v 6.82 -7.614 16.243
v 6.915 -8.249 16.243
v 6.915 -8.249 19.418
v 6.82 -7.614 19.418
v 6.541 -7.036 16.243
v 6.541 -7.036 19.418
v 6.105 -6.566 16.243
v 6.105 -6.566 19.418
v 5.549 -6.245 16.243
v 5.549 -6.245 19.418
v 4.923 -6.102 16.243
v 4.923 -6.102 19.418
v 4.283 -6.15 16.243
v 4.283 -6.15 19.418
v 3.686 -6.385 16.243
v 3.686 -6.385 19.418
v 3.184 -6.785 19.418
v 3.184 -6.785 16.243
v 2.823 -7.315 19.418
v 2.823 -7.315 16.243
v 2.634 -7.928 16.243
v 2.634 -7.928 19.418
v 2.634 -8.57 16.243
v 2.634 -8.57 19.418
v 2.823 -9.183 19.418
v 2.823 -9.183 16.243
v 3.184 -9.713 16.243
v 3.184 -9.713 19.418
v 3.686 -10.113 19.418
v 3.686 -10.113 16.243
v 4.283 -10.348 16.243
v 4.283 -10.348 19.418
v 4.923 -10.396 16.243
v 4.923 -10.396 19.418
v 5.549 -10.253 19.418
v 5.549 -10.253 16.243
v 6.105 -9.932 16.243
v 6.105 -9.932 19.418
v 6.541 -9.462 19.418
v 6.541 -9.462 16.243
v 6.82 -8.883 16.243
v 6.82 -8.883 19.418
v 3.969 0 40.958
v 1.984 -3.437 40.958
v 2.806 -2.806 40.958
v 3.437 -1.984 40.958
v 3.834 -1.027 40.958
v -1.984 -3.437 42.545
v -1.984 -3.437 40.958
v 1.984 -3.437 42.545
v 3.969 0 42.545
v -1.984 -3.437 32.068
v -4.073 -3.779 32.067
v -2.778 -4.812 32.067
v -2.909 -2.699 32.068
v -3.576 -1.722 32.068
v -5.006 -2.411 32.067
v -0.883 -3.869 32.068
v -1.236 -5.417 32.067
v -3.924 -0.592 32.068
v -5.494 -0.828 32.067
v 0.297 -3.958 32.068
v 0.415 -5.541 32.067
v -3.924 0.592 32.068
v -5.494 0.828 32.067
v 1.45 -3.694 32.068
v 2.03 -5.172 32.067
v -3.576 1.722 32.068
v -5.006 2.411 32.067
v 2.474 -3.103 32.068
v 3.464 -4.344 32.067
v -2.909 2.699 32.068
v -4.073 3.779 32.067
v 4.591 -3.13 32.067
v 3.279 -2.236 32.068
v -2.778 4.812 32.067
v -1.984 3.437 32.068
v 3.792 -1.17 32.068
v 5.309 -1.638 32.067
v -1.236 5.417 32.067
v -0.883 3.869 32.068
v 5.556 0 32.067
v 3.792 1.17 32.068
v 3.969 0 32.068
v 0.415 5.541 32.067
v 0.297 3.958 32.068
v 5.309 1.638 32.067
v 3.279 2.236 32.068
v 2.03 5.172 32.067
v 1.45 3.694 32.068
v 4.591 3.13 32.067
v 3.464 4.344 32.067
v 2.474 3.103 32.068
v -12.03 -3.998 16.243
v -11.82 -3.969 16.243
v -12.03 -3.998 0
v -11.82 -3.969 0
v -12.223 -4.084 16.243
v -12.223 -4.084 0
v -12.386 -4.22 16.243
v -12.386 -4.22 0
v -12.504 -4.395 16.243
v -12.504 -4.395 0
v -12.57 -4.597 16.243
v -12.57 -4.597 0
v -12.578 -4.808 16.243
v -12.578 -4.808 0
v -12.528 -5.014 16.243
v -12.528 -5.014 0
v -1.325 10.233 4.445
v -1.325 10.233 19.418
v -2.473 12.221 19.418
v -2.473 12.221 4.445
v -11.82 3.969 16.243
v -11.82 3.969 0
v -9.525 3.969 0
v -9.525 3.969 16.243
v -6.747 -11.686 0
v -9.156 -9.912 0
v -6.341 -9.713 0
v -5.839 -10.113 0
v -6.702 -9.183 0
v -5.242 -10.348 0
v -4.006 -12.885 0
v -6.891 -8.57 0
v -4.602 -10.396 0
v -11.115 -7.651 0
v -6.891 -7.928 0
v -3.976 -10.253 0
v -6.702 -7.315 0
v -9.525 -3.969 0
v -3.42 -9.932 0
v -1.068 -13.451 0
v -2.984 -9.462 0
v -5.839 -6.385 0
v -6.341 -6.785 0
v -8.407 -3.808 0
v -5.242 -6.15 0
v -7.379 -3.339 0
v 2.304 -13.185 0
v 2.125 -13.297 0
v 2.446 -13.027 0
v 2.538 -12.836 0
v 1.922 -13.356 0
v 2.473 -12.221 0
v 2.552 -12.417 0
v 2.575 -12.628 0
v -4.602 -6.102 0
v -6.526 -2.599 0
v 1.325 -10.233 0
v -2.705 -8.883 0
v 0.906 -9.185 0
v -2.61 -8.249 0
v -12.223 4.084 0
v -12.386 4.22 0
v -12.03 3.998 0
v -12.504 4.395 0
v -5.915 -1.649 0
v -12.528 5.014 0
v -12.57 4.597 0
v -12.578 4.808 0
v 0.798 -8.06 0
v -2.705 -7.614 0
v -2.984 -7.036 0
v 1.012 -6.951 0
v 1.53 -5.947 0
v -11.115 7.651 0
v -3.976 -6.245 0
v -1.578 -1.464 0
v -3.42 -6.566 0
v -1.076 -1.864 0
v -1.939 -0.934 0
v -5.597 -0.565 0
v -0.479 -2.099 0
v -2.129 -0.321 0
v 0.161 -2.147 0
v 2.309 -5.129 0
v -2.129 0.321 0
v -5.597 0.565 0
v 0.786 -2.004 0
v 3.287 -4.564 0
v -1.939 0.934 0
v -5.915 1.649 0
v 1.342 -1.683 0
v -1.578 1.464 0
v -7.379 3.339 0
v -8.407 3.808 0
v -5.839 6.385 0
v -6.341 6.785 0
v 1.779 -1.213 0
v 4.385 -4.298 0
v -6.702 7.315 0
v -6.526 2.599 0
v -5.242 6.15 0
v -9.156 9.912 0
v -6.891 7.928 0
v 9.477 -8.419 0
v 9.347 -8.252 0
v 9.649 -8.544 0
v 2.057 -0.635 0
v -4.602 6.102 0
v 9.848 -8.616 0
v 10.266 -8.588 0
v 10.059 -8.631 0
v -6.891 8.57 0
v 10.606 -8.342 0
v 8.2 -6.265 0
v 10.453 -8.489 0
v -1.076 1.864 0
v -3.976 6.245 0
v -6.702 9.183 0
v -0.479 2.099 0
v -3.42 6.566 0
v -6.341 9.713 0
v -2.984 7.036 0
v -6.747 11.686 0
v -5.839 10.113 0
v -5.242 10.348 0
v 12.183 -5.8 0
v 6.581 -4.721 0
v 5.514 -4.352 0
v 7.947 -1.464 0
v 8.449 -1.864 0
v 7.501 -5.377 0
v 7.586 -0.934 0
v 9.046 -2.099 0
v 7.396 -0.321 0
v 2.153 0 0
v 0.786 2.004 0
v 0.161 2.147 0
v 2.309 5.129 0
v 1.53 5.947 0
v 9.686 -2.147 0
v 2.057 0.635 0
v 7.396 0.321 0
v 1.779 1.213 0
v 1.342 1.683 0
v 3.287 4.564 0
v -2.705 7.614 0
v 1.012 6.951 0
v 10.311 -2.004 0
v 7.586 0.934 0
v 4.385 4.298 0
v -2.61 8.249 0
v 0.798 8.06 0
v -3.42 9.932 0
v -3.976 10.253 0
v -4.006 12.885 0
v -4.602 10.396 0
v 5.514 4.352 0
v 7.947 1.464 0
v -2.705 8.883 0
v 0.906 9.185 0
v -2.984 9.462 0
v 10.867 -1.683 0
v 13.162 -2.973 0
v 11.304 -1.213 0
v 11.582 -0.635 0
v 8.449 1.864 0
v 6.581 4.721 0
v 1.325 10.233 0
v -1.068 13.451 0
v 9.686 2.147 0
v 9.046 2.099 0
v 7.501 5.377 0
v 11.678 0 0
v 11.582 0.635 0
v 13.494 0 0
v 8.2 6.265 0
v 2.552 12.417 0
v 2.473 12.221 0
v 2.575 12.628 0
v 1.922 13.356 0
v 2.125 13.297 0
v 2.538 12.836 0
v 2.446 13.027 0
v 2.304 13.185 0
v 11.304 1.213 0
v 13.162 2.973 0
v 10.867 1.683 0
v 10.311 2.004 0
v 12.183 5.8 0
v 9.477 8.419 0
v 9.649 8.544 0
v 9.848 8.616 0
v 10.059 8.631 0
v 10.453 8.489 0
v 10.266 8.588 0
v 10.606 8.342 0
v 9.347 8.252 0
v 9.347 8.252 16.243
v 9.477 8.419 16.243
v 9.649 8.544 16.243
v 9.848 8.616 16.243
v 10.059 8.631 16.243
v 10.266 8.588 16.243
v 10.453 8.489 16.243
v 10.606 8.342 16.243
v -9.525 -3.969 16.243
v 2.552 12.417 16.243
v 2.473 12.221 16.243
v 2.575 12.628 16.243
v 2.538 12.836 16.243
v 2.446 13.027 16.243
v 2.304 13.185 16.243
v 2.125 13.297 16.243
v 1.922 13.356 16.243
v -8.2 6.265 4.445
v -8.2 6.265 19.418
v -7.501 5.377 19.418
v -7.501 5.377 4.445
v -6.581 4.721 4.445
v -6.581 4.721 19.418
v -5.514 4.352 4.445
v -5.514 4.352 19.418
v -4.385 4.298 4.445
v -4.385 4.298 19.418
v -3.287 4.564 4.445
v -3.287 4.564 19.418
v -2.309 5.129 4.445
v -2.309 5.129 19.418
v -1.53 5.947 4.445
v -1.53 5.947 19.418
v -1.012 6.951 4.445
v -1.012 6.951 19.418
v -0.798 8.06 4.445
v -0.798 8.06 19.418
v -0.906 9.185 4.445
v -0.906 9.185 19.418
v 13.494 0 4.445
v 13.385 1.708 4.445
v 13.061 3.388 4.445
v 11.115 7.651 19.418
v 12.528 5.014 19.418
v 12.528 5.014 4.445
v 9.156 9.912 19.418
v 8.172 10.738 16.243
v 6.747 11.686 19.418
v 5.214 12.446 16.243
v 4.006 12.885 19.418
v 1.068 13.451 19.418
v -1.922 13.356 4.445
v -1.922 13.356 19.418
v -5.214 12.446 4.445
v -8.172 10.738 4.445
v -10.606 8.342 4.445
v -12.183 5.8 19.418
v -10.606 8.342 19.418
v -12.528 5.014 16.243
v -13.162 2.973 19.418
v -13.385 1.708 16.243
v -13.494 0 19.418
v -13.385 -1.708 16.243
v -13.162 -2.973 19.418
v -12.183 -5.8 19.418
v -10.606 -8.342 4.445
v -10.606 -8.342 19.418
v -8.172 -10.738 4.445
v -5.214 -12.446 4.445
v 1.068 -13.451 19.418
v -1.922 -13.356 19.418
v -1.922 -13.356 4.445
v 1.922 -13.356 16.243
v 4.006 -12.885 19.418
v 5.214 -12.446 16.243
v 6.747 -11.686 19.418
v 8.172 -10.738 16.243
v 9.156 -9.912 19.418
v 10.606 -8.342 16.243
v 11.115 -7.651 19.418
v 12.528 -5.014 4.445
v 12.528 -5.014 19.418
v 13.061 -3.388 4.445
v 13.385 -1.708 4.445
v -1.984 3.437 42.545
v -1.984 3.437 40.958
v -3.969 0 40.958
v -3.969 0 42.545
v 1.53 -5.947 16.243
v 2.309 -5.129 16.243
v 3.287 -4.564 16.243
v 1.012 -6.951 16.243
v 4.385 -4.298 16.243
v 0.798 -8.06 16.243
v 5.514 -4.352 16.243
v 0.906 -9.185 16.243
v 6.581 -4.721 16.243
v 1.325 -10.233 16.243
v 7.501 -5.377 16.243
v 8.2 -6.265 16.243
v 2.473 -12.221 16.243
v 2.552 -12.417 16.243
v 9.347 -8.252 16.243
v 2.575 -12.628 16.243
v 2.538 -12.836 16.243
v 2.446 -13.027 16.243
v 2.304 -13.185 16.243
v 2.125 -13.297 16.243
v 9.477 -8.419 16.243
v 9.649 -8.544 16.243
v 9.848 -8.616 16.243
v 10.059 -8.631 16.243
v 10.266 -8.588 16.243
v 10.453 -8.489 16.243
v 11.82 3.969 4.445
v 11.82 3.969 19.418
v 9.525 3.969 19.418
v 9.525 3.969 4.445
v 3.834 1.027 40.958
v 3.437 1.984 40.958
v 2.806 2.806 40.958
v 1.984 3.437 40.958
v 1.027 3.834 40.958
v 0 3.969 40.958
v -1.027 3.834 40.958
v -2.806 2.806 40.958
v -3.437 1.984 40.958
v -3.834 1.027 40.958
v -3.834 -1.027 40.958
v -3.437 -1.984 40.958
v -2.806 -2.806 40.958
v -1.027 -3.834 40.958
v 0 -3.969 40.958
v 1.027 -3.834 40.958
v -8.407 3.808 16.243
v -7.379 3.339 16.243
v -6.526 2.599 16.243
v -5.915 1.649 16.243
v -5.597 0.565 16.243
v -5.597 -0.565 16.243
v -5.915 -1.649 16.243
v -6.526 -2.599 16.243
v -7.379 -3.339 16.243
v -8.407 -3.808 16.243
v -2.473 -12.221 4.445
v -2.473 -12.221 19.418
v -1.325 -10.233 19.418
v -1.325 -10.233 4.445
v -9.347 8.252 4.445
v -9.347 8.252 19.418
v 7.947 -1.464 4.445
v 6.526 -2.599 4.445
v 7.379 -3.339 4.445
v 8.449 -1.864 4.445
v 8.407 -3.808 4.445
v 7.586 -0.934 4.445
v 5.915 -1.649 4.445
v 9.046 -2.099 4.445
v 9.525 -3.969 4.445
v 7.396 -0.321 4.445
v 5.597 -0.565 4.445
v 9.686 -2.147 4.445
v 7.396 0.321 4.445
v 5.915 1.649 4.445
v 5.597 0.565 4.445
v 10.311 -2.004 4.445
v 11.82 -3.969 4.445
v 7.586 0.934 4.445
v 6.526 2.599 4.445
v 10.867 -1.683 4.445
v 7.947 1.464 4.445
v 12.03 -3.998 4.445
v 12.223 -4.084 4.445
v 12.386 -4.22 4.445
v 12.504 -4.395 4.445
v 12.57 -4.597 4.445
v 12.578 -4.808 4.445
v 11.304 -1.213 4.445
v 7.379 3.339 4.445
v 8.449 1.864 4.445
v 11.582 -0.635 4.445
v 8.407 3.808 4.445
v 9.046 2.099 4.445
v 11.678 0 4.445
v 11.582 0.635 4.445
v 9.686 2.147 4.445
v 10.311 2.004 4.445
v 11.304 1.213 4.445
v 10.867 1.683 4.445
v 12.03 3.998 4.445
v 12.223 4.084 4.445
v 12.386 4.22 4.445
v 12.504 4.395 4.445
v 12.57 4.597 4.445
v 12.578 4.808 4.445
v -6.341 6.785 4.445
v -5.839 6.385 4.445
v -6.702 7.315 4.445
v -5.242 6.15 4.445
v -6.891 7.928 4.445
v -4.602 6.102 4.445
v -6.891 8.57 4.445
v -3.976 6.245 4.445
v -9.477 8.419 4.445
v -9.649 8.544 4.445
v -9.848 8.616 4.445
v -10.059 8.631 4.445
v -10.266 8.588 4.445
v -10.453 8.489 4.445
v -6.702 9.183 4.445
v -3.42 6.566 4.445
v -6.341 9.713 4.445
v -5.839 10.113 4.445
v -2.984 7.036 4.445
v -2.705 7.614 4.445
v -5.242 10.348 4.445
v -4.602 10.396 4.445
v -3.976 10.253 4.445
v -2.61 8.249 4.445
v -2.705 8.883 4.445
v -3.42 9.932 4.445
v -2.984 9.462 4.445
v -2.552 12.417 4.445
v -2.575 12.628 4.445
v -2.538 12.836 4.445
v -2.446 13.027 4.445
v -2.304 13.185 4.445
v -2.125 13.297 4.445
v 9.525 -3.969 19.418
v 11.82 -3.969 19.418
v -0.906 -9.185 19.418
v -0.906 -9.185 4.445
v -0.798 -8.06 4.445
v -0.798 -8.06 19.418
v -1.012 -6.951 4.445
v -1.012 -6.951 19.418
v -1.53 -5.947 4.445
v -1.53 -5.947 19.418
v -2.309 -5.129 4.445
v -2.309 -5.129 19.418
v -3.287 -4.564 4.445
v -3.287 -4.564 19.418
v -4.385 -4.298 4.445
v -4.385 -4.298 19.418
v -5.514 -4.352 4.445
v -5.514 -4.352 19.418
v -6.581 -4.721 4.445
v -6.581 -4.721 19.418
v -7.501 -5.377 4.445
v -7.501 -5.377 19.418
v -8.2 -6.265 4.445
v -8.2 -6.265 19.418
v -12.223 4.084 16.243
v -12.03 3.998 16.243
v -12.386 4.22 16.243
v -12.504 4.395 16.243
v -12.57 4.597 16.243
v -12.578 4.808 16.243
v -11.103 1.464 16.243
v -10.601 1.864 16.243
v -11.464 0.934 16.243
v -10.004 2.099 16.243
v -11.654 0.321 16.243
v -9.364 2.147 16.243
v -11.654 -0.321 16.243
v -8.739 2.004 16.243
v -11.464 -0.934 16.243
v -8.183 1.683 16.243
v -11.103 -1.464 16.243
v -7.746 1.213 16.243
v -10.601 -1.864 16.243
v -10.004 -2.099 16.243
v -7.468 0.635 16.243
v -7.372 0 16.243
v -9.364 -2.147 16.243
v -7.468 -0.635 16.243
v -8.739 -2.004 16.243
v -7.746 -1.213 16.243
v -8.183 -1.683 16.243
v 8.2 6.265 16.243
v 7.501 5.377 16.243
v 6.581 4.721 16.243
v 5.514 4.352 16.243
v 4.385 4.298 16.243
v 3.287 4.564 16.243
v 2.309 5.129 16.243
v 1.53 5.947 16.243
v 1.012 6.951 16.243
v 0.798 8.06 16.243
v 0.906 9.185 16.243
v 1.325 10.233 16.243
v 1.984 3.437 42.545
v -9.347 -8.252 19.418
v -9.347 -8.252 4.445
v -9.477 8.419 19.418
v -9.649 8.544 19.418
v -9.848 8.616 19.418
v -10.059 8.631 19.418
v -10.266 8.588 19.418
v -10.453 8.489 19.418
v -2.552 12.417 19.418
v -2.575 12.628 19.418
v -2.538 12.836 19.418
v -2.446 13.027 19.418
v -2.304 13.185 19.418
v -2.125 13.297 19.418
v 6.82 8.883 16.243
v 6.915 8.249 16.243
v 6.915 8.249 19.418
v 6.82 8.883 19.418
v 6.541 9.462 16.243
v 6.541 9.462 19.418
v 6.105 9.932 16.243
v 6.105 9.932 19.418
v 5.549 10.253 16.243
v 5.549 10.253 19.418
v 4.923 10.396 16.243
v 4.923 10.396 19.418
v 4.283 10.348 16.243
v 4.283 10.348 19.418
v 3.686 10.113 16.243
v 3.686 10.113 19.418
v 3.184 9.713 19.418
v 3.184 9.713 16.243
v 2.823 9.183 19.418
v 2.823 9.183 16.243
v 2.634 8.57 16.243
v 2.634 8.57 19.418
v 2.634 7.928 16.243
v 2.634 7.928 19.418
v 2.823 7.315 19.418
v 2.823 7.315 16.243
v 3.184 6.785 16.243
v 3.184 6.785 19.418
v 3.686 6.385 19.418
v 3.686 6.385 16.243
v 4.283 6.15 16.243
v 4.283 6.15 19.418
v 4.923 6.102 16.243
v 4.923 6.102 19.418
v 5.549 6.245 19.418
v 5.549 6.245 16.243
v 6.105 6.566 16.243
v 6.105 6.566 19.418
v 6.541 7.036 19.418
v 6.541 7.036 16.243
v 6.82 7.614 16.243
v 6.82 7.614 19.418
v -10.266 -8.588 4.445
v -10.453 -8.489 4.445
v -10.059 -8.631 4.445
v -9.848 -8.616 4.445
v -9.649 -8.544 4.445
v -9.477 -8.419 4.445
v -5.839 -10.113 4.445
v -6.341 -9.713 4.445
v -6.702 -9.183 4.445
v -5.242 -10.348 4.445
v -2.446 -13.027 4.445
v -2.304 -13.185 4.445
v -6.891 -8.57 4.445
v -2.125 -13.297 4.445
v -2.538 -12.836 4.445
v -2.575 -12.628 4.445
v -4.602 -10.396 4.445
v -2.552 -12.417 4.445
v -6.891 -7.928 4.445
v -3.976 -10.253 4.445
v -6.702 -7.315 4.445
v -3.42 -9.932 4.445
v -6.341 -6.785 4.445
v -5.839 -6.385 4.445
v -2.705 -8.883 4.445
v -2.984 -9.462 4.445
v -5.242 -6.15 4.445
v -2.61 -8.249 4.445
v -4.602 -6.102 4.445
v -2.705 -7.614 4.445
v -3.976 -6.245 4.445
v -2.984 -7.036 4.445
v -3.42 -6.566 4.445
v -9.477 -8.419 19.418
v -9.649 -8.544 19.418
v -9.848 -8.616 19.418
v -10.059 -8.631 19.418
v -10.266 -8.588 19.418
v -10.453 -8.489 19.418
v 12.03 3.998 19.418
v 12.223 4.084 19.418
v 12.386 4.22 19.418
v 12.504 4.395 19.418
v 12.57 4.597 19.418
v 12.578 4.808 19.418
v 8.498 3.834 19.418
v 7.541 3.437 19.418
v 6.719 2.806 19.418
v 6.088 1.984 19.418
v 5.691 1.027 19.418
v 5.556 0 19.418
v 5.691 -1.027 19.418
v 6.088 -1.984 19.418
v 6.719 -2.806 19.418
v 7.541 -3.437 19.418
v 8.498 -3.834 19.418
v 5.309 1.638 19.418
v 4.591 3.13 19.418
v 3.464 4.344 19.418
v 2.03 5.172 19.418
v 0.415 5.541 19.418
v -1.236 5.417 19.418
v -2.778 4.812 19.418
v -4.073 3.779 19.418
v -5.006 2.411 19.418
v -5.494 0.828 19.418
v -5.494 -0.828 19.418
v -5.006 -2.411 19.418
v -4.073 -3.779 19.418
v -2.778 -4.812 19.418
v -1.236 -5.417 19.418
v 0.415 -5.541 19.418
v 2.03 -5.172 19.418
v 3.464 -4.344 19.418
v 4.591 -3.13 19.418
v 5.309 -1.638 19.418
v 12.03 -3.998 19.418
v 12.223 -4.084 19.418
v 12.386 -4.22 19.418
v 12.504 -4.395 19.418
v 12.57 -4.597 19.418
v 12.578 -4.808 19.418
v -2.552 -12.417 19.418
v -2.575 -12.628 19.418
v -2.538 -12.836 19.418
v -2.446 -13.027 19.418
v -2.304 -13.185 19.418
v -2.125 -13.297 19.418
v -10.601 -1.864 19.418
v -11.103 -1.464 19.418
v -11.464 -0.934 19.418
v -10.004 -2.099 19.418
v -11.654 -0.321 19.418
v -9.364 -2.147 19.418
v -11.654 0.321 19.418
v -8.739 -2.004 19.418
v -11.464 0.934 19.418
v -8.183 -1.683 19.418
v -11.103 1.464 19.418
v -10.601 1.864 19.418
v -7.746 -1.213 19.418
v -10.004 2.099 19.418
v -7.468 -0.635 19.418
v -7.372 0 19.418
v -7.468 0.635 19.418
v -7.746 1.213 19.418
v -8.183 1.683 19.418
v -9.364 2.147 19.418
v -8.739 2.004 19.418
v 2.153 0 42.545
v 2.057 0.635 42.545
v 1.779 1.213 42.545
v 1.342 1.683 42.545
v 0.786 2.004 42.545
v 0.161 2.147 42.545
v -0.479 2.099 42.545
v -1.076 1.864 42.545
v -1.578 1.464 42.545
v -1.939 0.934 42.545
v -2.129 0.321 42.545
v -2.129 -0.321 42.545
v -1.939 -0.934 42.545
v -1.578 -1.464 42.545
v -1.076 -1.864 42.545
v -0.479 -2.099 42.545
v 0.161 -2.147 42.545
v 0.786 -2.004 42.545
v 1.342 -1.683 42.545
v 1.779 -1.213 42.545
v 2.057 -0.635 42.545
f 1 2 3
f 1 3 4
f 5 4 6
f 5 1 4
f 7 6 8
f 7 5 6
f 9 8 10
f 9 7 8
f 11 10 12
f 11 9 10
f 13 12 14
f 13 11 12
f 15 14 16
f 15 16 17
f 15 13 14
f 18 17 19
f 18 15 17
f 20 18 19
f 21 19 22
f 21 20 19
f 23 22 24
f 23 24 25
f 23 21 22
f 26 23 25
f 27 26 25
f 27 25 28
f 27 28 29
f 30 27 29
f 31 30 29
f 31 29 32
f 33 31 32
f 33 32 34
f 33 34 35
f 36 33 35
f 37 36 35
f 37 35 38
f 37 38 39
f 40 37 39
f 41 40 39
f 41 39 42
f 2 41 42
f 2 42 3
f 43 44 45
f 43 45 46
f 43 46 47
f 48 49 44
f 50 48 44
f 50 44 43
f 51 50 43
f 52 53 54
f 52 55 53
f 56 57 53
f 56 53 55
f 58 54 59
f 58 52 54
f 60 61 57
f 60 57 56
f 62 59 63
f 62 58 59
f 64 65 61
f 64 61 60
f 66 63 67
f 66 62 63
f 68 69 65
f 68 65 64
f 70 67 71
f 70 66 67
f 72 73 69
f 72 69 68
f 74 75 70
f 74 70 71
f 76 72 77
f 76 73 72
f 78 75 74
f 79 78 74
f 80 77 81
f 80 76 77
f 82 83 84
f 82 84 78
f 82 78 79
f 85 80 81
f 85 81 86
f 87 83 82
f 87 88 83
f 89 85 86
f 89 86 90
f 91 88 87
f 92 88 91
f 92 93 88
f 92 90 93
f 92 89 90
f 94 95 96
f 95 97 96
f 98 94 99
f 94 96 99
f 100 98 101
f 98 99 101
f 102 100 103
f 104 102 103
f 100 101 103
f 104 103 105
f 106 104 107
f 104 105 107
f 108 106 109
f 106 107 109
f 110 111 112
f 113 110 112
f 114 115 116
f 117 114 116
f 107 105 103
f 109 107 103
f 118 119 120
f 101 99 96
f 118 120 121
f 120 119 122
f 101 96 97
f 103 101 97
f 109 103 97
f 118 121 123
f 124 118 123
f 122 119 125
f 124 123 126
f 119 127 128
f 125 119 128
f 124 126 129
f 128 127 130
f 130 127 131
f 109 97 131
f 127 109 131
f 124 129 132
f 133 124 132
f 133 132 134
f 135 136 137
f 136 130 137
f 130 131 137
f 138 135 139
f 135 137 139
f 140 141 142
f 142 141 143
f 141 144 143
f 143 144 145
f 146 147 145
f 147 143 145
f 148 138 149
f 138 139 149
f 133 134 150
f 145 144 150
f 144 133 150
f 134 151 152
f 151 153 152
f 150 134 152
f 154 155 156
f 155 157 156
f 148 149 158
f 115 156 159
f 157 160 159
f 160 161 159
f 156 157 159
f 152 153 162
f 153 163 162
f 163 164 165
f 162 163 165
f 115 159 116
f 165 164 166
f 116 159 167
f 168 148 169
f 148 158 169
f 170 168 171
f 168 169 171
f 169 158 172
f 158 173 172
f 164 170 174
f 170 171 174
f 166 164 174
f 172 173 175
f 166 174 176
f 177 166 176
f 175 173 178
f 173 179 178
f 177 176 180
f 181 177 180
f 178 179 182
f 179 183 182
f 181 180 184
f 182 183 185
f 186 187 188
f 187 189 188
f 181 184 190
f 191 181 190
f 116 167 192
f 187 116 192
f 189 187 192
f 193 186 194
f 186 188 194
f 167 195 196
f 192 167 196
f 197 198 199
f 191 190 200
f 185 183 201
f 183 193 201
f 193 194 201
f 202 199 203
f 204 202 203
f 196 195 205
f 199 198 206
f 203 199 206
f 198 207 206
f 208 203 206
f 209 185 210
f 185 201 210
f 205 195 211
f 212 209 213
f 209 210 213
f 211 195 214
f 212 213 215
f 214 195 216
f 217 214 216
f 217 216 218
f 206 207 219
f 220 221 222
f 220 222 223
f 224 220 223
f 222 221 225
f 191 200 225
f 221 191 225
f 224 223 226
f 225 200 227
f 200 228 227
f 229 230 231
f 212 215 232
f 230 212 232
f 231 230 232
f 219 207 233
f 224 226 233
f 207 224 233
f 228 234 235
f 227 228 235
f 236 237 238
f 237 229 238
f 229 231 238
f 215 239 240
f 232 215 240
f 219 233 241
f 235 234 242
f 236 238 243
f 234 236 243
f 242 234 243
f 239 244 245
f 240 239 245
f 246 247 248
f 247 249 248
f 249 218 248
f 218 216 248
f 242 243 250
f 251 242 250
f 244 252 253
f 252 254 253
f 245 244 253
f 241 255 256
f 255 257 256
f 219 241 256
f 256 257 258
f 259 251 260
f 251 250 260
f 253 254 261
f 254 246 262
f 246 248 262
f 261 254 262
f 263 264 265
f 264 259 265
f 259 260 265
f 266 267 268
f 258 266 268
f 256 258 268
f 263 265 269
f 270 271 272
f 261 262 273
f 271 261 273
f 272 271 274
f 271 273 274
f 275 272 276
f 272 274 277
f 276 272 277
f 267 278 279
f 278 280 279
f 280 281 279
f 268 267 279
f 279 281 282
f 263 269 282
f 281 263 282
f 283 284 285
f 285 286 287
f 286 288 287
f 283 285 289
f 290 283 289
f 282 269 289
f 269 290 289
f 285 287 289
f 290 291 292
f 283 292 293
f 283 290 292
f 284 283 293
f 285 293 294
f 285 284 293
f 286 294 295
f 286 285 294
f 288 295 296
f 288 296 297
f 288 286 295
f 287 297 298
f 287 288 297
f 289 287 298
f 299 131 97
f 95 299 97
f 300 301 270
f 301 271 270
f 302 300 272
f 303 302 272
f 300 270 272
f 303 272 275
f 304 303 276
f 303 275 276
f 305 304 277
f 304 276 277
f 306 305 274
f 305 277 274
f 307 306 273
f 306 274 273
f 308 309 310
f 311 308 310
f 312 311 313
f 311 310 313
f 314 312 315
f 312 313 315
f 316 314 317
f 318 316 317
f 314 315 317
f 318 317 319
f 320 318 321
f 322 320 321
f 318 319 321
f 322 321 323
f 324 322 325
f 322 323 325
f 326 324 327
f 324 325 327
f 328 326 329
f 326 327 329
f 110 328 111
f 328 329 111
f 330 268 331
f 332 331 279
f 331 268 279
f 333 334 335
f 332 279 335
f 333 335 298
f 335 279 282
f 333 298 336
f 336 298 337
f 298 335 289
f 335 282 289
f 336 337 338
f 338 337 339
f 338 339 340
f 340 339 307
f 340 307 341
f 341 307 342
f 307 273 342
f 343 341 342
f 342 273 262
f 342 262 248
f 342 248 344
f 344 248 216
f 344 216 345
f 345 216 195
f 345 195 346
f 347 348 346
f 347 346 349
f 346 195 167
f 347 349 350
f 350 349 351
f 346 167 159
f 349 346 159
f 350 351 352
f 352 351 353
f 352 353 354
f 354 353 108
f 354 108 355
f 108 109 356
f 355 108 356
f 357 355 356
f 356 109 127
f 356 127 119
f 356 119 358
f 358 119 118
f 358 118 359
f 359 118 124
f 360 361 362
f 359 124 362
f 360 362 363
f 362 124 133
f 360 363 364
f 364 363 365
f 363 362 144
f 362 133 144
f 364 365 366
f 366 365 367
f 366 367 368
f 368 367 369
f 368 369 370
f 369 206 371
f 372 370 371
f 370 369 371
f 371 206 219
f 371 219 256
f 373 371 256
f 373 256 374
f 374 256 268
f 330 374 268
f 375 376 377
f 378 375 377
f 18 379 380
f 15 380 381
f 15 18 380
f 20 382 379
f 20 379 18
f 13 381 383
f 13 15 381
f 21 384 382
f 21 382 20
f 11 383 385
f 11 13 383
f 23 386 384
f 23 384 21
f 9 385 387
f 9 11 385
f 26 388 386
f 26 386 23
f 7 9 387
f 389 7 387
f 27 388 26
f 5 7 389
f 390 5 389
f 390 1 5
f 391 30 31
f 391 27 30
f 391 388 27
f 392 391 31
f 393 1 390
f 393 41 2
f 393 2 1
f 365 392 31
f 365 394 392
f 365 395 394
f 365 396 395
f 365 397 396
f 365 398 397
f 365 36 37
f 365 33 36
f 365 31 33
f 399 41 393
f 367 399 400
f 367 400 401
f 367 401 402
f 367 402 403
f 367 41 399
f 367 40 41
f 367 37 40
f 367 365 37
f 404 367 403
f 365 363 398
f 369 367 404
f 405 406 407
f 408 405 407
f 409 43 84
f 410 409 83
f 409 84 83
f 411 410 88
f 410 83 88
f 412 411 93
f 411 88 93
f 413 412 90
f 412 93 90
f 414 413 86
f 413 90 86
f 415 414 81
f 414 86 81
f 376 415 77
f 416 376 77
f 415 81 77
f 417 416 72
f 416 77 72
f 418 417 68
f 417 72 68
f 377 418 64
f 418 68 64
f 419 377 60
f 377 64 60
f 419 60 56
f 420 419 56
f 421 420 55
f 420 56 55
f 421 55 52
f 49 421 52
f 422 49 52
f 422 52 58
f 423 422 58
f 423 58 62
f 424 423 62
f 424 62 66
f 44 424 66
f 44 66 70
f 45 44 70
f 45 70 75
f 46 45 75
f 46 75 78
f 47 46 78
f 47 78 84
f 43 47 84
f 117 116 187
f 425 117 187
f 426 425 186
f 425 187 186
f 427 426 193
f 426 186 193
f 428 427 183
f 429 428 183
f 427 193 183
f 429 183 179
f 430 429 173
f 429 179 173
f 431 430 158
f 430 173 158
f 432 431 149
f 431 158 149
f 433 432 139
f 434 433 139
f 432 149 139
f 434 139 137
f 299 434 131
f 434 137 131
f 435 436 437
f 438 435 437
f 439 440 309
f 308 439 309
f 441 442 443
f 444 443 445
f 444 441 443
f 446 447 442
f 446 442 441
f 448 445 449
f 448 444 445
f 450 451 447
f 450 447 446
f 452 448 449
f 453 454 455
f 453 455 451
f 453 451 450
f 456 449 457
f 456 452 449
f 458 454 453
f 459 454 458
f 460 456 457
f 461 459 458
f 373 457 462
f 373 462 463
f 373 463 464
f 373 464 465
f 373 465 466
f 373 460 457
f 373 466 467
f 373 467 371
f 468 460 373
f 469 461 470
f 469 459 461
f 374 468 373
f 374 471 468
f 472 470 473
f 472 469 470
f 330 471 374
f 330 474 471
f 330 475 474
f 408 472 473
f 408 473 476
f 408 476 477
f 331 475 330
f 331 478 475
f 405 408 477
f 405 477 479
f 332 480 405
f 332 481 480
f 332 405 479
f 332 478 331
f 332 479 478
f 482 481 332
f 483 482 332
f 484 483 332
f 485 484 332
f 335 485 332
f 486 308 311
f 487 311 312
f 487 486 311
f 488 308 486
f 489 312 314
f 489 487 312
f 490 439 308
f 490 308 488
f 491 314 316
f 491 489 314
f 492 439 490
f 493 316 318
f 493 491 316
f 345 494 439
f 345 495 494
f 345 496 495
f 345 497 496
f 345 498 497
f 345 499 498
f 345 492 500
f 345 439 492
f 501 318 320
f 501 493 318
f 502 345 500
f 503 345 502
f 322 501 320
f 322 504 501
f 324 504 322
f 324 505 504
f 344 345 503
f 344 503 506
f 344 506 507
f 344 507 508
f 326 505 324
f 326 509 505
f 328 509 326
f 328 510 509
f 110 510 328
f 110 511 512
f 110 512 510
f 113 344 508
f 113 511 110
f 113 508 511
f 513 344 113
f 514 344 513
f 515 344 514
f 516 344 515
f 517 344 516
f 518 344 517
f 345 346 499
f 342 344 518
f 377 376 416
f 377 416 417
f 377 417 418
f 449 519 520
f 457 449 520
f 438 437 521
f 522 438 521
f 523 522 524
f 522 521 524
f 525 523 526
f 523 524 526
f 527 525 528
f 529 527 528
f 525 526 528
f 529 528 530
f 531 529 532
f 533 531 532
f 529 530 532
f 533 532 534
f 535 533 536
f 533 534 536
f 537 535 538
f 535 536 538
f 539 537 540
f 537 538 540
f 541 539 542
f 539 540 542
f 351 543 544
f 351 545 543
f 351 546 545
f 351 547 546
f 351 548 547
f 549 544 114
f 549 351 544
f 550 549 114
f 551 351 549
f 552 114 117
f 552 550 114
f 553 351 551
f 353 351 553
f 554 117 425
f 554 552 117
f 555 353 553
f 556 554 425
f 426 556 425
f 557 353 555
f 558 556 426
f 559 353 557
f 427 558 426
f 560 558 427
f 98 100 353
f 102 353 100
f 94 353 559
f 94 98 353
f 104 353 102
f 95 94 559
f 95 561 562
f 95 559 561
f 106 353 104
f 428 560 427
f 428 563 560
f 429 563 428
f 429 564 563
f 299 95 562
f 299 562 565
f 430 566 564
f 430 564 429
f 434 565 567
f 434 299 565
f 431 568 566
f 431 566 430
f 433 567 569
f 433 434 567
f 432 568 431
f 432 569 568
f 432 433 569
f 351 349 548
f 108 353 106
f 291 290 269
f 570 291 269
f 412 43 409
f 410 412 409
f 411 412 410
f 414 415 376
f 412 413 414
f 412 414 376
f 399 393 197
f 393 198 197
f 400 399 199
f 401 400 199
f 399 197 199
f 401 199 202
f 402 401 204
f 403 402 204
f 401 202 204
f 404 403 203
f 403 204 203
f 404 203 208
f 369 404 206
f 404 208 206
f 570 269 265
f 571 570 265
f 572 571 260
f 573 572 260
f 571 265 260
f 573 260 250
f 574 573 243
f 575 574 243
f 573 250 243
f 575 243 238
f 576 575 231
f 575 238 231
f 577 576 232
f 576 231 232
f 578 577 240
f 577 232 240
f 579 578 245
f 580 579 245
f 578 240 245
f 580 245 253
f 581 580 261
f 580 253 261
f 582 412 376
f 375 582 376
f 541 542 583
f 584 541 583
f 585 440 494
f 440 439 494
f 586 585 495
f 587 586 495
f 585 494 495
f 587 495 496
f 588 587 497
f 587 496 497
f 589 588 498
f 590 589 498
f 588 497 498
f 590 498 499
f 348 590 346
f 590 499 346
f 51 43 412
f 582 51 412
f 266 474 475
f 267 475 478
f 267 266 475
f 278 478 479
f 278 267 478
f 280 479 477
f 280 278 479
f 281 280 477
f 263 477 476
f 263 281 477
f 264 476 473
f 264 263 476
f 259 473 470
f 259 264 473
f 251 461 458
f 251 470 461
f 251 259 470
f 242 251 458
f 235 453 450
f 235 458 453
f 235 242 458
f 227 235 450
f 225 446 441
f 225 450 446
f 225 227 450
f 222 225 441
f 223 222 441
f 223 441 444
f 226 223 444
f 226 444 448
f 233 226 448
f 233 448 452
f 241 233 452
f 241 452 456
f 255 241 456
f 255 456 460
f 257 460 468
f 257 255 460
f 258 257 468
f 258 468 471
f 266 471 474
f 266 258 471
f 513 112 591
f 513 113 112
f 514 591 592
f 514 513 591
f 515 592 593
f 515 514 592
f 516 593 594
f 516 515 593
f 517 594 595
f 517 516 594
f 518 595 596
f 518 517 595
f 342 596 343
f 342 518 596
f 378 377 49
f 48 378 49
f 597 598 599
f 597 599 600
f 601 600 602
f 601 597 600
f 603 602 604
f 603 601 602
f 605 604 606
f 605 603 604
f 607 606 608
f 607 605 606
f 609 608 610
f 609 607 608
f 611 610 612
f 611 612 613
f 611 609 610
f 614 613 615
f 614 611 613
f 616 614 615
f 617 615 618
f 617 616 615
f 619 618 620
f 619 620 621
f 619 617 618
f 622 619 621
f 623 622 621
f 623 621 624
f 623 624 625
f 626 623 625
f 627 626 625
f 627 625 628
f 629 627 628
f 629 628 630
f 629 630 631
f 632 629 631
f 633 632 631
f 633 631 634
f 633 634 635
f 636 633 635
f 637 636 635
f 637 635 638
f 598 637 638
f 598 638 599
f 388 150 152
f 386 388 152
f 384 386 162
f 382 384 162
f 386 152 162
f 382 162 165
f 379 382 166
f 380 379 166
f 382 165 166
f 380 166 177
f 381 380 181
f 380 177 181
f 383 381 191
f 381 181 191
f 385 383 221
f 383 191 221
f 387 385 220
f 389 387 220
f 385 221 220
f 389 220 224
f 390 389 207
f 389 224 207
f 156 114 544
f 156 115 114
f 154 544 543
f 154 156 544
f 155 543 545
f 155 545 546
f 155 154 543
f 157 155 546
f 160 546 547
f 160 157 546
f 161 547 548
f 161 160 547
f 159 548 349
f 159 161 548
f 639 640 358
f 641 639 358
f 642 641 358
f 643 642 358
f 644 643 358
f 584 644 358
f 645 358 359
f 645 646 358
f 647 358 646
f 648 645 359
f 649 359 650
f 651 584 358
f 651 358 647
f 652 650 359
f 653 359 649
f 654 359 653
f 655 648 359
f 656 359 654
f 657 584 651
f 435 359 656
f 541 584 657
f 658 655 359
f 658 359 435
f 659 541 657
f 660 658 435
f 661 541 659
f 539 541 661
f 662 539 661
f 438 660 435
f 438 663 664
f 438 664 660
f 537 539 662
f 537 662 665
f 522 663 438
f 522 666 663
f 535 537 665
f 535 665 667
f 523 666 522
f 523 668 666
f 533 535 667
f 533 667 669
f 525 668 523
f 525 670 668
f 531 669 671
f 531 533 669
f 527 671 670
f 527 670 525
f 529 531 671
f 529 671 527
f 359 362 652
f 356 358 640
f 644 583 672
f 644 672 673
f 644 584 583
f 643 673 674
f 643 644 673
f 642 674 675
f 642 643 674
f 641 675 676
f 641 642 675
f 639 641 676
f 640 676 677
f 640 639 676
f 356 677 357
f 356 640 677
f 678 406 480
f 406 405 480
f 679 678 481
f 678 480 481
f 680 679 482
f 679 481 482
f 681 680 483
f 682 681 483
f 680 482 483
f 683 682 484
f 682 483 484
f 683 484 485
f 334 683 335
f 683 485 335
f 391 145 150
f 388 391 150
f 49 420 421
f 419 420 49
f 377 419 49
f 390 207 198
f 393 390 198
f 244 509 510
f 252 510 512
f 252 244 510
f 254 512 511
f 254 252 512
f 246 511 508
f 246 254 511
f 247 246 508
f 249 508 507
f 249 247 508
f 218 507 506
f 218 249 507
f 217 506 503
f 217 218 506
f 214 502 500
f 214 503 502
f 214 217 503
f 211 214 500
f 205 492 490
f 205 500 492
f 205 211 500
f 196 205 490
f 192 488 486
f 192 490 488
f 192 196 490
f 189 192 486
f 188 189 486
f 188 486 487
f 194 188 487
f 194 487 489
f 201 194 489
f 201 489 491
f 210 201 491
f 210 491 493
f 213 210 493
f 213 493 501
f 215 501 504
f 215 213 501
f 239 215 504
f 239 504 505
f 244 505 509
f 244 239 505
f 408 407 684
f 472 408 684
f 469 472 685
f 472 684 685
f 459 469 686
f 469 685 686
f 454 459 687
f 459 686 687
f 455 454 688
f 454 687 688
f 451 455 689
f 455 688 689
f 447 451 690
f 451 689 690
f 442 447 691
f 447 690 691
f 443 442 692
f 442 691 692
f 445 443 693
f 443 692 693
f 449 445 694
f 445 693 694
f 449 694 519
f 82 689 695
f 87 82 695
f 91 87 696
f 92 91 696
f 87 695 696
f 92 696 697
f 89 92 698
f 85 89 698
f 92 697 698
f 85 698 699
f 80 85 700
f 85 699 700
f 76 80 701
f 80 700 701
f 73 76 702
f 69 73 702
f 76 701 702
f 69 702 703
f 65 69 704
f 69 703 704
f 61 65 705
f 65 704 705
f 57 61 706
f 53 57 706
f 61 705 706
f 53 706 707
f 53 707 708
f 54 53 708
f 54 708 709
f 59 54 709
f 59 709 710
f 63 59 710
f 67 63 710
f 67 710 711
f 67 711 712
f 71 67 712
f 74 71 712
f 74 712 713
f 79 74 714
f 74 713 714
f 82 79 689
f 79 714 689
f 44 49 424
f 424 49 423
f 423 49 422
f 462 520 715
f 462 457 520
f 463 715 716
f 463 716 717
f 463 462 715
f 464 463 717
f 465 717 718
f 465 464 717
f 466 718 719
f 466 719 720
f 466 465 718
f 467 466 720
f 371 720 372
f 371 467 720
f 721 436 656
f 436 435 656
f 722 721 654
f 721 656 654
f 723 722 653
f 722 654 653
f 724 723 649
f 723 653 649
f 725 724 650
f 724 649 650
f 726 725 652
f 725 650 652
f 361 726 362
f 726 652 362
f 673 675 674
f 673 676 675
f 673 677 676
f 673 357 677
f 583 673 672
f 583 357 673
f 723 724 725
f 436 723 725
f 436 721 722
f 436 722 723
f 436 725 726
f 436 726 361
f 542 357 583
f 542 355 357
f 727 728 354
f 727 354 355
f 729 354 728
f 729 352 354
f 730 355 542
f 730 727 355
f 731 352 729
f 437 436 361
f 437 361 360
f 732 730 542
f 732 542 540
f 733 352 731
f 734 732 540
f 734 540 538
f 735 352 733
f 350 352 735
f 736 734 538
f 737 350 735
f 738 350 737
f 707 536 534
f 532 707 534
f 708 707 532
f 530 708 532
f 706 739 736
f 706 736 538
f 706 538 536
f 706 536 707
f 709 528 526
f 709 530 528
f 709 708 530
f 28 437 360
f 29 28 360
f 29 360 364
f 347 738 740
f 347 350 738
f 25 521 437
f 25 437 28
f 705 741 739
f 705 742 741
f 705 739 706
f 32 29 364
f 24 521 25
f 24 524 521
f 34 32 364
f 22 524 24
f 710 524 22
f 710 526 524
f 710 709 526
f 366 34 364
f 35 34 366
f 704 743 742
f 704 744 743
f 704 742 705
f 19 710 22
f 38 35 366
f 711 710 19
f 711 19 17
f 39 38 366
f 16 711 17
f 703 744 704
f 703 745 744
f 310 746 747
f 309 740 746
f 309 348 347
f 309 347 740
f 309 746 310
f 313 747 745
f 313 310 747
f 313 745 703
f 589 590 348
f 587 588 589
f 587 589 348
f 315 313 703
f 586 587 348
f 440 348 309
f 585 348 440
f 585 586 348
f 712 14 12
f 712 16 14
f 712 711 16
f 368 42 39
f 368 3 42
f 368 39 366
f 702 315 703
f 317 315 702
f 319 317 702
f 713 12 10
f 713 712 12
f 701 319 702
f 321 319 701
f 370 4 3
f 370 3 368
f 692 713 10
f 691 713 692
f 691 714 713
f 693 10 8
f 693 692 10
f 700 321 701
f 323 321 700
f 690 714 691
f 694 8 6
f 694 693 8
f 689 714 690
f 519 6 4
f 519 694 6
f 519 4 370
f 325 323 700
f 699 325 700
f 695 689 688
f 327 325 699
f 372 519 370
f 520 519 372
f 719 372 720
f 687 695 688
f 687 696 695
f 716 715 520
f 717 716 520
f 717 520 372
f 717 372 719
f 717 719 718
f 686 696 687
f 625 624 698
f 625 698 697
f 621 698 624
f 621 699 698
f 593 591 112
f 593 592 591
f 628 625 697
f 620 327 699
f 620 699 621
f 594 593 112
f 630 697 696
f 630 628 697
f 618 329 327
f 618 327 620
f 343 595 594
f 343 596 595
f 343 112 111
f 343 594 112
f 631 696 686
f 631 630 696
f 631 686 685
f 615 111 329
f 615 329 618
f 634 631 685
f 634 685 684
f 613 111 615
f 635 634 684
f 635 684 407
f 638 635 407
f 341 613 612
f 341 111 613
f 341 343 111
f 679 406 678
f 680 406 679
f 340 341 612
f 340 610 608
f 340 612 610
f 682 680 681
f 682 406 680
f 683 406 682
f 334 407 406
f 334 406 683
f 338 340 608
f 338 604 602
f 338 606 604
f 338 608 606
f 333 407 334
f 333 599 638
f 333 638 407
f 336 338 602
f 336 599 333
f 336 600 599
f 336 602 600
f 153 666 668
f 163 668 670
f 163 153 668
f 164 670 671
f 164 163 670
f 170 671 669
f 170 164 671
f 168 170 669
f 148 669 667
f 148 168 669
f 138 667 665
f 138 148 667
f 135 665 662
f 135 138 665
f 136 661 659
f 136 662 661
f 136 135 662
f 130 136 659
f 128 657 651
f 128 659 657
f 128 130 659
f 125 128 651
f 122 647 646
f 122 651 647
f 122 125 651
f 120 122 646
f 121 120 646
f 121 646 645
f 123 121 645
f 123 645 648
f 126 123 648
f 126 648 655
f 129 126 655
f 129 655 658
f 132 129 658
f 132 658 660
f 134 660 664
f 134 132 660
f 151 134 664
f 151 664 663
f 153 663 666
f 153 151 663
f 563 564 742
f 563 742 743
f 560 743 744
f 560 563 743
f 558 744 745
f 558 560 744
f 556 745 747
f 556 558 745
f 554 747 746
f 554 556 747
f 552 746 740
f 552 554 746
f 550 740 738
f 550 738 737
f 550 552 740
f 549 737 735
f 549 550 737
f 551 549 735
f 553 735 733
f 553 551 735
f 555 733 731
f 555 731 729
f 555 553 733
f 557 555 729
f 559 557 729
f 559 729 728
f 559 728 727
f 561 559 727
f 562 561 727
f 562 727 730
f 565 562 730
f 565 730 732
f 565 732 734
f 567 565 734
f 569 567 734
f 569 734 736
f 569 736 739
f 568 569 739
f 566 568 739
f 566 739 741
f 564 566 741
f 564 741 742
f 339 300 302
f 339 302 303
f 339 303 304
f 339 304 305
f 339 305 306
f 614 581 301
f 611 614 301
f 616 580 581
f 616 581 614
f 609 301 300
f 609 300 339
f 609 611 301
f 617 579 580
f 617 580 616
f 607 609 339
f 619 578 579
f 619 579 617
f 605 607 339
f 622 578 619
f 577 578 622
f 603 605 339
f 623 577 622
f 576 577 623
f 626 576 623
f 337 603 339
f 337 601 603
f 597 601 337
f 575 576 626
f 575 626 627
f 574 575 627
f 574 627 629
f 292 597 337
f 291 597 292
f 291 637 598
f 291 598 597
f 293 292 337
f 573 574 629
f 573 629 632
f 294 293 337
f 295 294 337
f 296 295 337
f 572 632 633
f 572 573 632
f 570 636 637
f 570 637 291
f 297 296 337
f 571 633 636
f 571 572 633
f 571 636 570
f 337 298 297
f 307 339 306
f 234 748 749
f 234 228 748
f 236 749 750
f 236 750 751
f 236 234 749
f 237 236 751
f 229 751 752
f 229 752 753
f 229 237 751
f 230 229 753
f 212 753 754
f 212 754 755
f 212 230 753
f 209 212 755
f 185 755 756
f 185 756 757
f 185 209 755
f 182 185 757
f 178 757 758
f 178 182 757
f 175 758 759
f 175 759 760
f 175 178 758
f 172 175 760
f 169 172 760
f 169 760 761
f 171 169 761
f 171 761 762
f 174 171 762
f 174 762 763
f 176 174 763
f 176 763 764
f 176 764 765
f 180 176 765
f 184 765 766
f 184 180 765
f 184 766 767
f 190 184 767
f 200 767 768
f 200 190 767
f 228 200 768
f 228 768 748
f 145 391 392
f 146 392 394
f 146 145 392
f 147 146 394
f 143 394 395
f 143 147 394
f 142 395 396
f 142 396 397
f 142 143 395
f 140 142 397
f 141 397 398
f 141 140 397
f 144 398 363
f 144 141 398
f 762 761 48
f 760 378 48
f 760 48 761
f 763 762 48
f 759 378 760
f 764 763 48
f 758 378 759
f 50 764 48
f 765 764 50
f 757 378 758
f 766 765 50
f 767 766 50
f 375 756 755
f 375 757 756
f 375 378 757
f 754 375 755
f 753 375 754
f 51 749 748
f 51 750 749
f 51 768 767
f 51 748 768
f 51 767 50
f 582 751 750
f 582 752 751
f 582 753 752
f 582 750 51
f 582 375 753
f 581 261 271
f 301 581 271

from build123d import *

# Parameters (mm, degrees)
F0_R      = 13.49375
F0_R_2    = 2.15265
F1_DEPTH  = 19.4183
F5_DEPTH  = 14.9733
F7_DEPTH  = 16.2433
F8_R      = 5.55625
F8_R_2    = 2.15265
F9_DEPTH  = 12.6492
F10_R     = 3.96875
F10_R_2   = 2.15265
F11_DEPTH = 8.89
F12_R     = 2.15265
F13_DEPTH = 1.5875
F14_R     = 0.762


with BuildPart() as f1:
    # F0 (on Top) → F1 (new body)
    with BuildSketch(Plane.XY):
        Circle(F0_R)
        with Locations((-4.7625, -8.248892)):
            Circle(F0_R_2, mode=Mode.SUBTRACT)
        with Locations((4.7625, -8.248892)):
            Circle(F0_R_2, mode=Mode.SUBTRACT)
        with Locations((-9.525, 0)):
            Circle(F0_R_2, mode=Mode.SUBTRACT)
        with Locations((-4.7625, 8.248892)):
            Circle(F0_R_2, mode=Mode.SUBTRACT)
        Circle(F0_R_2, mode=Mode.SUBTRACT)
        with Locations((9.525, 0)):
            Circle(F0_R_2, mode=Mode.SUBTRACT)
        with Locations((4.7625, 8.248892)):
            Circle(F0_R_2, mode=Mode.SUBTRACT)
    extrude(amount=F1_DEPTH)

    # F4 (on face) → F5 (cut, through all)
    with BuildSketch(Plane.XY.offset(19.4183)):
        with BuildLine():
            Line((-3.309837, 13.670305), (-10.183913, 9.701555))
            Line((-10.183913, 9.701555), (-8.199538, 6.264517))
            ThreePointArc((-8.199538, 6.264517), (-2.778125, 4.811854), (-1.325462, 10.233267))
            Line((-1.325462, 10.233267), (-3.309837, 13.670305))
        make_face()
        with BuildLine():
            Line((13.49375, 3.96875), (9.525, 3.96875))
            ThreePointArc((9.525, 3.96875), (5.55625, 0), (9.525, -3.96875))
            Line((9.525, -3.96875), (13.49375, -3.96875))
            Line((13.49375, -3.96875), (13.49375, 3.96875))
        make_face()
        with BuildLine():
            Line((-8.199538, -6.264517), (-10.183913, -9.701555))
            Line((-10.183913, -9.701555), (-3.309837, -13.670305))
            Line((-3.309837, -13.670305), (-1.325462, -10.233267))
            ThreePointArc((-1.325462, -10.233267), (-2.778125, -4.811854), (-8.199538, -6.264517))
        make_face()
    extrude(amount=-F5_DEPTH, mode=Mode.SUBTRACT)

    # F6 (on face) → F7 (cut, through all)
    with BuildSketch(Plane(origin=(0, 0, 0), x_dir=(1, 0, 0), z_dir=(0, 0, -1))):
        with BuildLine():
            Line((1.325462, -10.233267), (3.309837, -13.670305))
            Line((3.309837, -13.670305), (10.183913, -9.701555))
            Line((10.183913, -9.701555), (8.199538, -6.264517))
            ThreePointArc((8.199538, -6.264517), (2.778125, -4.811854), (1.325462, -10.233267))
        make_face()
        with BuildLine():
            Line((10.183913, 9.701555), (3.309837, 13.670305))
            Line((3.309837, 13.670305), (1.325462, 10.233267))
            ThreePointArc((1.325462, 10.233267), (2.778125, 4.811854), (8.199538, 6.264517))
            Line((8.199538, 6.264517), (10.183913, 9.701555))
        make_face()
        with BuildLine():
            Line((-9.525, 3.96875), (-13.49375, 3.96875))
            Line((-13.49375, 3.96875), (-13.49375, -3.96875))
            Line((-13.49375, -3.96875), (-9.525, -3.96875))
            ThreePointArc((-9.525, -3.96875), (-5.55625, 0), (-9.525, 3.96875))
        make_face()
    extrude(amount=-F7_DEPTH, mode=Mode.SUBTRACT)

    # F8 (on face) → F9 (join)
    with BuildSketch(Plane.XY.offset(19.4183)):
        Circle(F8_R)
        Circle(F8_R_2, mode=Mode.SUBTRACT)
    extrude(amount=F9_DEPTH)

    # F10 (on face) → F11 (join)
    with BuildSketch(Plane.XY.offset(32.0675)):
        Circle(F10_R)
        Circle(F10_R_2, mode=Mode.SUBTRACT)
    extrude(amount=F11_DEPTH)

    # F12 (on face) → F13 (join)
    with BuildSketch(Plane.XY.offset(40.9575)):
        Polygon((1.984375, 3.437038), (-1.984375, 3.437038), (-3.96875, 0), (-1.984375, -3.437038), (1.984375, -3.437038), (3.96875, 0), align=None)
        Circle(F12_R, mode=Mode.SUBTRACT)
    extrude(amount=F13_DEPTH)

    # F14
    f14_edges = [f1.edges().sort_by_distance(p)[0] for p in [
        (-9.885494, -9.184678, 11.93165),
        (3.011417, -13.153428, 8.12165),
        (9.885494, -9.184678, 8.12165),
        (12.896911, 3.96875, 11.93165),
        (12.896911, -3.96875, 11.93165),
        (-3.011417, -13.153428, 11.93165),
        (9.885494, 9.184678, 8.12165),
        (3.011417, 13.153428, 8.12165),
        (-3.011417, 13.153428, 11.93165),
        (-9.885494, 9.184678, 11.93165),
        (-12.896911, 3.96875, 8.12165),
        (-12.896911, -3.96875, 8.12165),
    ]]
    fillet(f14_edges, radius=F14_R)


solid = f1.part
